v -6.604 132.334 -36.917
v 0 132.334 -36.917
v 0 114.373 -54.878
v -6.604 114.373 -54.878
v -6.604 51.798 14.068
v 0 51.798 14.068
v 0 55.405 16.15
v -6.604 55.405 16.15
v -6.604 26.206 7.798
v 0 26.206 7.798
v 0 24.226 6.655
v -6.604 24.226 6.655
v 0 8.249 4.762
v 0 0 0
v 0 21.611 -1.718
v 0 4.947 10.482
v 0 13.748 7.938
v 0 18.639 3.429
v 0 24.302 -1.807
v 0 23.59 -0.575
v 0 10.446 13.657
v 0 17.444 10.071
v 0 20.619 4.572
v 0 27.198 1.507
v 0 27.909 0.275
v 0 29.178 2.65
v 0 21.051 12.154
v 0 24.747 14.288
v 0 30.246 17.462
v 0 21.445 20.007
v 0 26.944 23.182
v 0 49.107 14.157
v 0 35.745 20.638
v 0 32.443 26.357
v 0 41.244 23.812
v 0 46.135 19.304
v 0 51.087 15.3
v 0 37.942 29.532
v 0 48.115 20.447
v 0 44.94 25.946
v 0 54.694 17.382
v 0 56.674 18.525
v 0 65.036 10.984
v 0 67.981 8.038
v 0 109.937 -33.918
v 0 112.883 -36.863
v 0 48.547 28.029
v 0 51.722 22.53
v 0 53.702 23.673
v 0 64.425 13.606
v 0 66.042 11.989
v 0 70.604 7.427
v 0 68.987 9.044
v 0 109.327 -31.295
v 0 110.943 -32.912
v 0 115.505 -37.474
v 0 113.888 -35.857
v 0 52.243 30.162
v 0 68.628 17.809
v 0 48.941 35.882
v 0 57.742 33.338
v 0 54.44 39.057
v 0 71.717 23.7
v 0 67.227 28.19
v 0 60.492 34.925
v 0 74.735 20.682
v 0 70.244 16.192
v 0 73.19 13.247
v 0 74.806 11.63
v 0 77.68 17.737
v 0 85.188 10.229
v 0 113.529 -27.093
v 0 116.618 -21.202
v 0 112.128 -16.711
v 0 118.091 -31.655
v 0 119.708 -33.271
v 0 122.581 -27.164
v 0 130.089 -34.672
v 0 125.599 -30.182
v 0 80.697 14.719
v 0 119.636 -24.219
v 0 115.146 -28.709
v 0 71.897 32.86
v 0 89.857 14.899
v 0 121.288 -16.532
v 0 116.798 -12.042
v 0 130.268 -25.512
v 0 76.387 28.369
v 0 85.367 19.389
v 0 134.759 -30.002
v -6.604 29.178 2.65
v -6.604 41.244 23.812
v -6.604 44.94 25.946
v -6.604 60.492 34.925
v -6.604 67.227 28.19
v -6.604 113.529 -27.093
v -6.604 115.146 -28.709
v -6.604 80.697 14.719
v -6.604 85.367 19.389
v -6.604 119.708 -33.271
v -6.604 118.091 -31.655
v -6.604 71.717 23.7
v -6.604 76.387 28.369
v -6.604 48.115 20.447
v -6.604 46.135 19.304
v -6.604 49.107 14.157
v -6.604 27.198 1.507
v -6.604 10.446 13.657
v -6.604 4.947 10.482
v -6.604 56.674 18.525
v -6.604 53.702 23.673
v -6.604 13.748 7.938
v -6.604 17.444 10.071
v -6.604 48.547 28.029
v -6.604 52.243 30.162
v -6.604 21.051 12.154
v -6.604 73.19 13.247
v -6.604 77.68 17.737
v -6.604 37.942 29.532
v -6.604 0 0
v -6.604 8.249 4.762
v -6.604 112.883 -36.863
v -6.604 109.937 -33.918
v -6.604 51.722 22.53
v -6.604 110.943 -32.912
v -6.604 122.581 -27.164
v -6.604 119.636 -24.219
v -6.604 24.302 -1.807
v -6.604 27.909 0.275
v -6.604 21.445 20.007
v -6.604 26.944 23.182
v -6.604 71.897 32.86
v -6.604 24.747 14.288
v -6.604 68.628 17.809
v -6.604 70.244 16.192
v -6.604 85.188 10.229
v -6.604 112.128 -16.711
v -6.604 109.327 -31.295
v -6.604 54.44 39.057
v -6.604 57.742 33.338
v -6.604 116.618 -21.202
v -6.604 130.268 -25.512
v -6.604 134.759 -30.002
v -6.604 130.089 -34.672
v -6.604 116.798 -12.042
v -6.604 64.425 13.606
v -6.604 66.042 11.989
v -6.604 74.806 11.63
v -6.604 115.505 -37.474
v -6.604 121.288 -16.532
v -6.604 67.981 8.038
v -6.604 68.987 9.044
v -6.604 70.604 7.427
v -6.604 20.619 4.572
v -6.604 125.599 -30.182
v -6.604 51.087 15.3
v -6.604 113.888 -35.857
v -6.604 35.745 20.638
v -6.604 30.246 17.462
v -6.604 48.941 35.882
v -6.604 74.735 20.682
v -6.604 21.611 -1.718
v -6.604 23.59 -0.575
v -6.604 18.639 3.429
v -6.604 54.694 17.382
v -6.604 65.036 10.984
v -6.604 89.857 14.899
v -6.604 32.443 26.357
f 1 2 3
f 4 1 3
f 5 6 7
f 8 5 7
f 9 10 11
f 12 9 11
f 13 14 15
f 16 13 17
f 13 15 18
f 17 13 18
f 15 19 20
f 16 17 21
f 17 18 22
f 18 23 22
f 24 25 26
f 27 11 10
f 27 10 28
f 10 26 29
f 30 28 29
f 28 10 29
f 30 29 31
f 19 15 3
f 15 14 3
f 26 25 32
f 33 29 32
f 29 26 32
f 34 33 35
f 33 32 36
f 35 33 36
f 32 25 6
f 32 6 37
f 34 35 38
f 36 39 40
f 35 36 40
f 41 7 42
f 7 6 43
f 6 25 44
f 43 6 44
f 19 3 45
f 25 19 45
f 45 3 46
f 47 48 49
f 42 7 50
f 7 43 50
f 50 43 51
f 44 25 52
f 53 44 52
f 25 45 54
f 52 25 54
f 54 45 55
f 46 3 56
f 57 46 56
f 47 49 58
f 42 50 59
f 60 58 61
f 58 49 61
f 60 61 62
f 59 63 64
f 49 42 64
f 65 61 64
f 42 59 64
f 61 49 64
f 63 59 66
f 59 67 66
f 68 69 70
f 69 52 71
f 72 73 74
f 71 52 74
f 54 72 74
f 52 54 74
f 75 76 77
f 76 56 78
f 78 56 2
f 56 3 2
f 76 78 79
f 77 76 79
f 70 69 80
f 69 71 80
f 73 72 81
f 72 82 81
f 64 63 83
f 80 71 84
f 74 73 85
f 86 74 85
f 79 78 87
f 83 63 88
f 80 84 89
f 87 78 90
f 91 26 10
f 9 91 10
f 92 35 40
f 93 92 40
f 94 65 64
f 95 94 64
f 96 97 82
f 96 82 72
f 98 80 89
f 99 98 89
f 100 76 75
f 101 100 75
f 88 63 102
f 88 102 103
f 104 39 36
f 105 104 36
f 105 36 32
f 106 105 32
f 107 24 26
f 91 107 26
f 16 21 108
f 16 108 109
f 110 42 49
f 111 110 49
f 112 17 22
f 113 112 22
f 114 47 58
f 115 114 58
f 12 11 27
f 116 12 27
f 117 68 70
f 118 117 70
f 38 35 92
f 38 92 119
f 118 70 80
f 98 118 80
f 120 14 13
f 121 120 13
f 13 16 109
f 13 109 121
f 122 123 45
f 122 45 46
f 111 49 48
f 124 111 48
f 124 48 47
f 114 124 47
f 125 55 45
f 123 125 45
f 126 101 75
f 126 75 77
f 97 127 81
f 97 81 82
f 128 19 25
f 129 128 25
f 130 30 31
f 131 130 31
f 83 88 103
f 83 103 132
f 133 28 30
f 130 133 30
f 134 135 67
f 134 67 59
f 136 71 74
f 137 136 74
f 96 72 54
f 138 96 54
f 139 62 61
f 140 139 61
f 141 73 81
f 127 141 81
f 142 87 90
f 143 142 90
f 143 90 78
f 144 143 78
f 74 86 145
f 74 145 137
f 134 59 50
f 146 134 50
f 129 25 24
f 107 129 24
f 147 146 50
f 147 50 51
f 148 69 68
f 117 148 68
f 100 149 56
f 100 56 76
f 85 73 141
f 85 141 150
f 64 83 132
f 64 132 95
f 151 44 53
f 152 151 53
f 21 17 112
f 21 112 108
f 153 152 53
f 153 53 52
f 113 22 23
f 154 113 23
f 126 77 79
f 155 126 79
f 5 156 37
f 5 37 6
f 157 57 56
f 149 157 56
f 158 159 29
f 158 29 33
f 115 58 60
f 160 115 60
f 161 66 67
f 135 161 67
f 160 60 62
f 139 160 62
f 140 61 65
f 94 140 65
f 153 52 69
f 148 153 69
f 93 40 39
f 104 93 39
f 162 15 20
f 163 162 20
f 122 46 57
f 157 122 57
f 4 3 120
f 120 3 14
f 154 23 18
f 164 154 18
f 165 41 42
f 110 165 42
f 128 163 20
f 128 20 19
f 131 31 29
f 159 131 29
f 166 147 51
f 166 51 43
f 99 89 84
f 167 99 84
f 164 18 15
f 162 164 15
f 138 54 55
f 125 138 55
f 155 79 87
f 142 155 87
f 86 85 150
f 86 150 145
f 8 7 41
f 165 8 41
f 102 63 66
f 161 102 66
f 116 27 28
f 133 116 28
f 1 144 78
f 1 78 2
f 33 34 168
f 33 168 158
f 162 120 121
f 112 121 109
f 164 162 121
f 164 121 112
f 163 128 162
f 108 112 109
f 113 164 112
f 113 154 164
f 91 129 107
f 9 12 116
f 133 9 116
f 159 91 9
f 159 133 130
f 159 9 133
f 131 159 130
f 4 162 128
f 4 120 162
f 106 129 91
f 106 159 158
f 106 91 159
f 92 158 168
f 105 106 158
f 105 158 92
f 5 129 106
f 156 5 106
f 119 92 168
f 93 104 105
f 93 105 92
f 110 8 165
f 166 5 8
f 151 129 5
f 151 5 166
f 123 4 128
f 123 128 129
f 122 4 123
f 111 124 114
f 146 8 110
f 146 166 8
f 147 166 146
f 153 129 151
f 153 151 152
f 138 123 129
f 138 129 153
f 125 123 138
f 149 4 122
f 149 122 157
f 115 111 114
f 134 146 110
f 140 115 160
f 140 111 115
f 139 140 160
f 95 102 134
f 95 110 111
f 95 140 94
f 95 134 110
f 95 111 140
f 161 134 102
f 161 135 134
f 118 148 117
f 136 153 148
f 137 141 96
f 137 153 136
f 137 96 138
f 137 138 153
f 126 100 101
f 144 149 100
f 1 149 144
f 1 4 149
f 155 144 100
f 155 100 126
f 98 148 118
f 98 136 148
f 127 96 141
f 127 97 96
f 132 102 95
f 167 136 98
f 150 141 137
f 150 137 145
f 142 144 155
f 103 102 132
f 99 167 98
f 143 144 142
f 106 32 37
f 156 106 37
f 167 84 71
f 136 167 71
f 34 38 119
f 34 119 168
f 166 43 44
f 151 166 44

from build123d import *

# Parameters (mm, degrees)
BOSS_EXTRUDE1_DEPTH = 6.604
CUT_EXTRUDE1_DEPTH  = 7.604
BOSS_EXTRUDE2_DEPTH = 6.604


with BuildPart() as part:
    # Sketch1 → Boss-Extrude1 (new body)
    with BuildSketch(Plane(origin=(0, 0, 0), x_dir=(0, 0, -1), z_dir=(1, 0, 0))):
        Polygon((0, 0), (-34.925, 60.491874454), (36.917048969, 132.333923423), (54.877561211, 114.373411181), align=None)
    extrude(amount=-BOSS_EXTRUDE1_DEPTH)

    # Sketch2 → Cut-Extrude1 (cut, through all)
    with BuildSketch(Plane(origin=(0, 0, 0), x_dir=(0, 0, -1), z_dir=(1, 0, 0))):
        Polygon((31.654618882, 118.091237215), (27.164490821, 122.581365275), (24.218966813, 119.635841268), (28.709094874, 115.145713207), (27.092648772, 113.529267105), (31.295408637, 109.326507241), (32.911854739, 110.942953343), (33.917643424, 109.937164657), (36.863167432, 112.882688665), (35.857378746, 113.88847735), (37.473824848, 115.504923452), (33.271064983, 119.707683317), align=None)
        Polygon((-13.246661724, 73.18995661), (-17.736789784, 77.68008467), (-20.682313792, 74.734560662), (-16.192185731, 70.244432602), (-17.808631833, 68.6279865), (-13.605871969, 64.425226635), (-11.989425867, 66.041672737), (-10.983637181, 65.035884052), (-8.038113174, 67.981408059), (-9.043901859, 68.987196745), (-7.427455757, 70.603642847), (-11.630215622, 74.806402711), align=None)
        Polygon((-17.382330096, 54.69427888), (-18.525330096, 56.674012953), (-23.672638686, 53.702212953), (-22.529638686, 51.72247888), (-28.0289, 48.54747888), (-25.9461, 44.939963458), (-20.446838686, 48.114963458), (-19.303838686, 46.135229385), (-14.156530096, 49.107029385), (-15.299530096, 51.086763458), (-14.067695562, 51.797963458), (-16.150495562, 55.40547888), align=None)
        Polygon((-2.650330096, 29.177706383), (-7.797638686, 26.205906383), (-6.654638686, 24.22617231), (-12.1539, 21.05117231), (-10.0711, 17.443656888), (-4.571838686, 20.618656888), (-3.428838686, 18.638922815), (1.718469904, 21.610722815), (0.575469904, 23.590456888), (1.807304438, 24.301656888), (-0.275495562, 27.90917231), (-1.507330096, 27.19797231), align=None)
    extrude(amount=-CUT_EXTRUDE1_DEPTH, mode=Mode.SUBTRACT)

    # Sketch3 → Boss-Extrude2 (add)
    with BuildSketch(Plane(origin=(0, 0, 0), x_dir=(0, 0, -1), z_dir=(1, 0, 0))):
        Polygon((30.002251755, 134.758592576), (34.671984938, 130.088859393), (30.181856878, 125.598731332), (25.512123695, 130.268464515), align=None)
        Polygon((21.201600757, 116.618475211), (16.531867574, 121.288208394), (12.041739513, 116.798080333), (16.711472696, 112.12834715), align=None)
        Polygon((-14.719423728, 80.697450727), (-19.389156911, 85.36718391), (-14.89902885, 89.85731197), (-10.229295667, 85.187578787), align=None)
        Polygon((-28.369413032, 76.386927789), (-32.859541092, 71.896799728), (-28.189807909, 67.227066545), (-23.699679849, 71.717194606), align=None)
        Polygon((-39.056731767, 54.440243797), (-33.3375, 57.742243797), (-30.1625, 52.242982483), (-35.881731767, 48.940982483), align=None)
        Polygon((-23.8125, 41.244459855), (-29.531731767, 37.942459855), (-26.356731767, 32.443198541), (-20.6375, 35.745198541), align=None)
        Polygon((-23.181731767, 26.943937227), (-17.4625, 30.245937227), (-14.2875, 24.746675913), (-20.006731767, 21.444675913), align=None)
        Polygon((-13.656731767, 10.446153285), (-10.481731767, 4.946891971), (-4.7625, 8.248891971), (-7.9375, 13.748153285), align=None)
    extrude(amount=-BOSS_EXTRUDE2_DEPTH)


solid = part.part
